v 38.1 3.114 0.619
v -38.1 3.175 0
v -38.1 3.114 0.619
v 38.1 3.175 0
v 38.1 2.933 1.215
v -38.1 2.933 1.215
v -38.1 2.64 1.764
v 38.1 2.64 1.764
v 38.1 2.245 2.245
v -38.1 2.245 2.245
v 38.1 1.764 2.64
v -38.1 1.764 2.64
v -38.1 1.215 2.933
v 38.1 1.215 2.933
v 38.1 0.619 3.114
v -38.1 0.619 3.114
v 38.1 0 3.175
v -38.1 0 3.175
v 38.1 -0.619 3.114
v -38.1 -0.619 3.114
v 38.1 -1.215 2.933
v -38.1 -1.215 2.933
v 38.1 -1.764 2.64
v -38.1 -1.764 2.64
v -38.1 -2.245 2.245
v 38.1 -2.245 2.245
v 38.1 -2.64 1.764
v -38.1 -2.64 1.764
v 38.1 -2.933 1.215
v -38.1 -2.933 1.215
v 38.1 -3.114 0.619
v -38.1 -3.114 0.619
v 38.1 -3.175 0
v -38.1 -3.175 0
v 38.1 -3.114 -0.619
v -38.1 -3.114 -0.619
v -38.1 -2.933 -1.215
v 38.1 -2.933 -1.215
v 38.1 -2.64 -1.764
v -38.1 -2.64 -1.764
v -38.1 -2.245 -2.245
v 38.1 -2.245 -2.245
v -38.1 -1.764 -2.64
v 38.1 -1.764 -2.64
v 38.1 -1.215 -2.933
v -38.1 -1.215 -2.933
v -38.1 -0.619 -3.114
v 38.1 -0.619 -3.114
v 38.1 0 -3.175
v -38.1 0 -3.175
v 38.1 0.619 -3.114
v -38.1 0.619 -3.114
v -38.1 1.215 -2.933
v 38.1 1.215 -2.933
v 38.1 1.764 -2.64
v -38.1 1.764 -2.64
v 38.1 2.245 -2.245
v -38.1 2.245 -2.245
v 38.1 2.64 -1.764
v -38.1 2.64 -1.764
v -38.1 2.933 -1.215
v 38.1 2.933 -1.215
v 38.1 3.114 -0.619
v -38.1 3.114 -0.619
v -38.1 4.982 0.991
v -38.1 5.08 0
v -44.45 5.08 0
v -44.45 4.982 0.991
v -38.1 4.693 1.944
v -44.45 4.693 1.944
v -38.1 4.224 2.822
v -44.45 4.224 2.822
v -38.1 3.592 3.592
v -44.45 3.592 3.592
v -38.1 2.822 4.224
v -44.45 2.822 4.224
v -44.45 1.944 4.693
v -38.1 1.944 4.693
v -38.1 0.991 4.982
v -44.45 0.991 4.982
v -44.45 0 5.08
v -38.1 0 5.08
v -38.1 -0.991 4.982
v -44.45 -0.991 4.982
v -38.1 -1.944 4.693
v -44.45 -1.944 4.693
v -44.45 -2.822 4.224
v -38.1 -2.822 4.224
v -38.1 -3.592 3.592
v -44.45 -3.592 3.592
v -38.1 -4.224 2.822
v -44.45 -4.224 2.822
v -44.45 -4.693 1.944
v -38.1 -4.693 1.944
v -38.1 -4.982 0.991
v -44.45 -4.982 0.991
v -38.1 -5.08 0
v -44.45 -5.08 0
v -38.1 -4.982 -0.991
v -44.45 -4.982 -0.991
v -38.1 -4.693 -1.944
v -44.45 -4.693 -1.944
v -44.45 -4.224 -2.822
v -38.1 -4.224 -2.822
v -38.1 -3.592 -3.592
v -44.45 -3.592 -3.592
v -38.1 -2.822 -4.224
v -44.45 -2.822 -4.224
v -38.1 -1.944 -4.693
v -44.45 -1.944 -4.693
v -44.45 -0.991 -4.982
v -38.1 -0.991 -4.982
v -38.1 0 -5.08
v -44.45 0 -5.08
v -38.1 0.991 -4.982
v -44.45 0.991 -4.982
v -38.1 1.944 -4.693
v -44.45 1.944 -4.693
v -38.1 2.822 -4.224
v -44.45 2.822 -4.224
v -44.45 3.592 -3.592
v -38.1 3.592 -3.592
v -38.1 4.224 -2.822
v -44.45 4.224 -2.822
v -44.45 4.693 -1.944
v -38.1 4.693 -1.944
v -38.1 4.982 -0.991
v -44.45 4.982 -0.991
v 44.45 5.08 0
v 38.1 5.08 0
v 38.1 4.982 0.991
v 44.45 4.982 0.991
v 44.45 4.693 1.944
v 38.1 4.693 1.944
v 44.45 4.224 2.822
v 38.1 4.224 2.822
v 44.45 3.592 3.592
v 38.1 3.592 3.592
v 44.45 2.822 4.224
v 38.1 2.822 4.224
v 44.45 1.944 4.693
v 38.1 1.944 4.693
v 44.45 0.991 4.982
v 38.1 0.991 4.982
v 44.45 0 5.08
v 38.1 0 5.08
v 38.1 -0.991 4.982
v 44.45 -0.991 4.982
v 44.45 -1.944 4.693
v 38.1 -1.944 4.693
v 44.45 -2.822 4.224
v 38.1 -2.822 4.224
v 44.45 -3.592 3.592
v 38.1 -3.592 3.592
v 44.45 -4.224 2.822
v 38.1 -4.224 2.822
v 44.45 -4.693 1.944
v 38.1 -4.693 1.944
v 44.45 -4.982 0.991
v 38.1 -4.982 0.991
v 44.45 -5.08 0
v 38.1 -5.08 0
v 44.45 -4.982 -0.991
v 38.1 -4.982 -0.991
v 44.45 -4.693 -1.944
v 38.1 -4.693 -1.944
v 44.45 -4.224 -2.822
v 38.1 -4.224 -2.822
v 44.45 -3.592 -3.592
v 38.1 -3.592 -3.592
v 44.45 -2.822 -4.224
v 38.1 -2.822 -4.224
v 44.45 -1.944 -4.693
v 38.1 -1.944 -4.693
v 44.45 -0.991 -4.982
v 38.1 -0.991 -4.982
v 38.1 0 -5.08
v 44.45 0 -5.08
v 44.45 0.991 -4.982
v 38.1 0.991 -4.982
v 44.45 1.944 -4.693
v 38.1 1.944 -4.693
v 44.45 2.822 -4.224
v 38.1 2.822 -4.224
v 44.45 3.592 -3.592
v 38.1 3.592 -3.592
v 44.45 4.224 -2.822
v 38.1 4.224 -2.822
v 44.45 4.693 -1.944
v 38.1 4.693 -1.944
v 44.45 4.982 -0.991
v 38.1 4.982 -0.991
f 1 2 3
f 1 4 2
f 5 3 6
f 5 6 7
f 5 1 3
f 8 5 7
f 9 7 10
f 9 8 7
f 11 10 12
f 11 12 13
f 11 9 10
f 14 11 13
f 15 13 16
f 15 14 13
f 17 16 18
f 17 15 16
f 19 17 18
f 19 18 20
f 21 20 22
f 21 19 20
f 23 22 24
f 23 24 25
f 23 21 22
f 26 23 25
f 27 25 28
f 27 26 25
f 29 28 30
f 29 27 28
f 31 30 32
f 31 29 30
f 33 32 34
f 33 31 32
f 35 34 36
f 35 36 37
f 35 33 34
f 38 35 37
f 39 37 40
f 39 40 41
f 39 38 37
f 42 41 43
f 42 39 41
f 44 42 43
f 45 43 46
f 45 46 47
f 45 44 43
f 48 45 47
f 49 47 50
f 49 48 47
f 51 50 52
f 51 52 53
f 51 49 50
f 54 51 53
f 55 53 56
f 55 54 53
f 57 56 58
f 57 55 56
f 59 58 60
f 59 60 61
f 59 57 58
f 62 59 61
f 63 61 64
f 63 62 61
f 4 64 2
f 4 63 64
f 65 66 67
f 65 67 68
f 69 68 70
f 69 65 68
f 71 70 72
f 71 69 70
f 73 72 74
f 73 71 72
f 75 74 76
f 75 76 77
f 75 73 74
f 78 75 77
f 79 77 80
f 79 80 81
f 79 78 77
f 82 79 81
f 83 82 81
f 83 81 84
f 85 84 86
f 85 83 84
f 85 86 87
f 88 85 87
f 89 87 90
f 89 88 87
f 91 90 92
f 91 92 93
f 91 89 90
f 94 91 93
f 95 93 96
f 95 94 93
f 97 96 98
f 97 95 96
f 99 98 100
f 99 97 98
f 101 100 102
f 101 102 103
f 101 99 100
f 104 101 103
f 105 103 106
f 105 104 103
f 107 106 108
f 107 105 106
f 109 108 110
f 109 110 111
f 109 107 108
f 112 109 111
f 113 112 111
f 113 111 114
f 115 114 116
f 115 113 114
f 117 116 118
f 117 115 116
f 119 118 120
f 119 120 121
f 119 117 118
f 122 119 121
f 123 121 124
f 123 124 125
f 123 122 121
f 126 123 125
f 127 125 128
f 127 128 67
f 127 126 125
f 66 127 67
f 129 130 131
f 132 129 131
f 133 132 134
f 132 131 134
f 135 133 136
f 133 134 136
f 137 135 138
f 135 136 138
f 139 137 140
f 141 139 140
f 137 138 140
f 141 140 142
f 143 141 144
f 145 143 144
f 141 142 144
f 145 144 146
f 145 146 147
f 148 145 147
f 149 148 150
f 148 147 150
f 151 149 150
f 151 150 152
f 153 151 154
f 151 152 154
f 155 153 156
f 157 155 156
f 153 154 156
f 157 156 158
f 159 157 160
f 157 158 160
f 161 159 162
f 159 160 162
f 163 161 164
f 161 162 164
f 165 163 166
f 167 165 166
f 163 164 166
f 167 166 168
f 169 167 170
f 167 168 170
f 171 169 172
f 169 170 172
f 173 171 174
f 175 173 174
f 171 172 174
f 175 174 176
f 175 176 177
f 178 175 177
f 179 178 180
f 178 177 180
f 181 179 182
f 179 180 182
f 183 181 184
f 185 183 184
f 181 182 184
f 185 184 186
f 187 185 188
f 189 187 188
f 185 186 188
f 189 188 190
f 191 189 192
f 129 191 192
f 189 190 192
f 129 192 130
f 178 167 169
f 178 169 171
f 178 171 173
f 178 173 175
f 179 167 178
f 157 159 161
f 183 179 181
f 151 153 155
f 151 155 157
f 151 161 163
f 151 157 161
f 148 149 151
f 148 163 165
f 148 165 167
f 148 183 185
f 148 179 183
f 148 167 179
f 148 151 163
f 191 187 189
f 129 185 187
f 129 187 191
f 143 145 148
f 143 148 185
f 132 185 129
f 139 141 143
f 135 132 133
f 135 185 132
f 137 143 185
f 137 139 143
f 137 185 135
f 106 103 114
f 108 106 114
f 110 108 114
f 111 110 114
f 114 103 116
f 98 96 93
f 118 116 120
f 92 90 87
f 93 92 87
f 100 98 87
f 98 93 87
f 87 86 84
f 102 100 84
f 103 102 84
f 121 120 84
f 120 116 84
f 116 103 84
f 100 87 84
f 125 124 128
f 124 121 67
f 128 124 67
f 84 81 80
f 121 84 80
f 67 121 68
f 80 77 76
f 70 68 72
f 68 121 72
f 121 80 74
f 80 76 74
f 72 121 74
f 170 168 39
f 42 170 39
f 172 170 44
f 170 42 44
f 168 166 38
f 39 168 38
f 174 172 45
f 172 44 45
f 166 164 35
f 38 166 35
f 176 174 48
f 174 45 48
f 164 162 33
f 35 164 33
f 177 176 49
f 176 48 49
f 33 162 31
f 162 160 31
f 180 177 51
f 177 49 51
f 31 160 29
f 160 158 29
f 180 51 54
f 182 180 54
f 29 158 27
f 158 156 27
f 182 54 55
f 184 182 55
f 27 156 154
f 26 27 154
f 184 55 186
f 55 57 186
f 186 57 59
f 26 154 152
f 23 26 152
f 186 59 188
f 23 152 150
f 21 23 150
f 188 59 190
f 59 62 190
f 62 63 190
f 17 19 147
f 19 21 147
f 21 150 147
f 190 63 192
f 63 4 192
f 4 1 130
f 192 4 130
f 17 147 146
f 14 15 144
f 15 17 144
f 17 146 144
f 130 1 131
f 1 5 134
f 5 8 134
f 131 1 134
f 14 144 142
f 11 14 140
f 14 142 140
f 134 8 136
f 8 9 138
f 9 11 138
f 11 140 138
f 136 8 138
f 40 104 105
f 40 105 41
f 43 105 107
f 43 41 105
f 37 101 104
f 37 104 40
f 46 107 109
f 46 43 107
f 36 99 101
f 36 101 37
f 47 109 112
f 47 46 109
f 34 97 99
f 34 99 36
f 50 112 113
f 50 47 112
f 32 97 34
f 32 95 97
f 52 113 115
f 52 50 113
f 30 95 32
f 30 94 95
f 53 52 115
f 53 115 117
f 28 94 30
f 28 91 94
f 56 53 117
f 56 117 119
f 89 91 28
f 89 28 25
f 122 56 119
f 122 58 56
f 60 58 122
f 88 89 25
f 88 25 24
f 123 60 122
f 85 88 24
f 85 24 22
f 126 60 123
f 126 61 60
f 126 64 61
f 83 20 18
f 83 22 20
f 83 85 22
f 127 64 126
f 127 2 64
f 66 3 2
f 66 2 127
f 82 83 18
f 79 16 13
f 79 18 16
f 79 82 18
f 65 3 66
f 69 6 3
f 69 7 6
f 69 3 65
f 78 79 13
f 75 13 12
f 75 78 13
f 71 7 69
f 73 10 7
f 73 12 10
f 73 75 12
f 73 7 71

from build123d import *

# Parameters (mm, degrees)
F0_R     = 3.175
F1_DEPTH = 38.1
F2_R     = 5.08
F2_R_2   = 3.175
F3_DEPTH = 6.35


# Not quite as in the source:
# - a pattern or mirror of a feature is missing from the dataset's text; its kind, count and spacing are read off the source's solid


with BuildPart() as f1:
    # F0 (on Right) → F1 (new body, symmetric)
    with BuildSketch(Plane.YZ):
        Circle(F0_R)
    extrude(amount=F1_DEPTH, both=True)

    # F2 (on face) → F3 (join)
    with BuildSketch(Plane.YZ.offset(38.1)):
        Circle(F2_R)
        Circle(F2_R_2, mode=Mode.SUBTRACT)
        Circle(F2_R_2)
    f3 = extrude(amount=F3_DEPTH)

    # F3_copies: F3 across plane
    add(f3.mirror(Plane(origin=(0, 0, 0), x_dir=(0, 0, -1), z_dir=(-1, 0, 0))))


solid = f1.part
